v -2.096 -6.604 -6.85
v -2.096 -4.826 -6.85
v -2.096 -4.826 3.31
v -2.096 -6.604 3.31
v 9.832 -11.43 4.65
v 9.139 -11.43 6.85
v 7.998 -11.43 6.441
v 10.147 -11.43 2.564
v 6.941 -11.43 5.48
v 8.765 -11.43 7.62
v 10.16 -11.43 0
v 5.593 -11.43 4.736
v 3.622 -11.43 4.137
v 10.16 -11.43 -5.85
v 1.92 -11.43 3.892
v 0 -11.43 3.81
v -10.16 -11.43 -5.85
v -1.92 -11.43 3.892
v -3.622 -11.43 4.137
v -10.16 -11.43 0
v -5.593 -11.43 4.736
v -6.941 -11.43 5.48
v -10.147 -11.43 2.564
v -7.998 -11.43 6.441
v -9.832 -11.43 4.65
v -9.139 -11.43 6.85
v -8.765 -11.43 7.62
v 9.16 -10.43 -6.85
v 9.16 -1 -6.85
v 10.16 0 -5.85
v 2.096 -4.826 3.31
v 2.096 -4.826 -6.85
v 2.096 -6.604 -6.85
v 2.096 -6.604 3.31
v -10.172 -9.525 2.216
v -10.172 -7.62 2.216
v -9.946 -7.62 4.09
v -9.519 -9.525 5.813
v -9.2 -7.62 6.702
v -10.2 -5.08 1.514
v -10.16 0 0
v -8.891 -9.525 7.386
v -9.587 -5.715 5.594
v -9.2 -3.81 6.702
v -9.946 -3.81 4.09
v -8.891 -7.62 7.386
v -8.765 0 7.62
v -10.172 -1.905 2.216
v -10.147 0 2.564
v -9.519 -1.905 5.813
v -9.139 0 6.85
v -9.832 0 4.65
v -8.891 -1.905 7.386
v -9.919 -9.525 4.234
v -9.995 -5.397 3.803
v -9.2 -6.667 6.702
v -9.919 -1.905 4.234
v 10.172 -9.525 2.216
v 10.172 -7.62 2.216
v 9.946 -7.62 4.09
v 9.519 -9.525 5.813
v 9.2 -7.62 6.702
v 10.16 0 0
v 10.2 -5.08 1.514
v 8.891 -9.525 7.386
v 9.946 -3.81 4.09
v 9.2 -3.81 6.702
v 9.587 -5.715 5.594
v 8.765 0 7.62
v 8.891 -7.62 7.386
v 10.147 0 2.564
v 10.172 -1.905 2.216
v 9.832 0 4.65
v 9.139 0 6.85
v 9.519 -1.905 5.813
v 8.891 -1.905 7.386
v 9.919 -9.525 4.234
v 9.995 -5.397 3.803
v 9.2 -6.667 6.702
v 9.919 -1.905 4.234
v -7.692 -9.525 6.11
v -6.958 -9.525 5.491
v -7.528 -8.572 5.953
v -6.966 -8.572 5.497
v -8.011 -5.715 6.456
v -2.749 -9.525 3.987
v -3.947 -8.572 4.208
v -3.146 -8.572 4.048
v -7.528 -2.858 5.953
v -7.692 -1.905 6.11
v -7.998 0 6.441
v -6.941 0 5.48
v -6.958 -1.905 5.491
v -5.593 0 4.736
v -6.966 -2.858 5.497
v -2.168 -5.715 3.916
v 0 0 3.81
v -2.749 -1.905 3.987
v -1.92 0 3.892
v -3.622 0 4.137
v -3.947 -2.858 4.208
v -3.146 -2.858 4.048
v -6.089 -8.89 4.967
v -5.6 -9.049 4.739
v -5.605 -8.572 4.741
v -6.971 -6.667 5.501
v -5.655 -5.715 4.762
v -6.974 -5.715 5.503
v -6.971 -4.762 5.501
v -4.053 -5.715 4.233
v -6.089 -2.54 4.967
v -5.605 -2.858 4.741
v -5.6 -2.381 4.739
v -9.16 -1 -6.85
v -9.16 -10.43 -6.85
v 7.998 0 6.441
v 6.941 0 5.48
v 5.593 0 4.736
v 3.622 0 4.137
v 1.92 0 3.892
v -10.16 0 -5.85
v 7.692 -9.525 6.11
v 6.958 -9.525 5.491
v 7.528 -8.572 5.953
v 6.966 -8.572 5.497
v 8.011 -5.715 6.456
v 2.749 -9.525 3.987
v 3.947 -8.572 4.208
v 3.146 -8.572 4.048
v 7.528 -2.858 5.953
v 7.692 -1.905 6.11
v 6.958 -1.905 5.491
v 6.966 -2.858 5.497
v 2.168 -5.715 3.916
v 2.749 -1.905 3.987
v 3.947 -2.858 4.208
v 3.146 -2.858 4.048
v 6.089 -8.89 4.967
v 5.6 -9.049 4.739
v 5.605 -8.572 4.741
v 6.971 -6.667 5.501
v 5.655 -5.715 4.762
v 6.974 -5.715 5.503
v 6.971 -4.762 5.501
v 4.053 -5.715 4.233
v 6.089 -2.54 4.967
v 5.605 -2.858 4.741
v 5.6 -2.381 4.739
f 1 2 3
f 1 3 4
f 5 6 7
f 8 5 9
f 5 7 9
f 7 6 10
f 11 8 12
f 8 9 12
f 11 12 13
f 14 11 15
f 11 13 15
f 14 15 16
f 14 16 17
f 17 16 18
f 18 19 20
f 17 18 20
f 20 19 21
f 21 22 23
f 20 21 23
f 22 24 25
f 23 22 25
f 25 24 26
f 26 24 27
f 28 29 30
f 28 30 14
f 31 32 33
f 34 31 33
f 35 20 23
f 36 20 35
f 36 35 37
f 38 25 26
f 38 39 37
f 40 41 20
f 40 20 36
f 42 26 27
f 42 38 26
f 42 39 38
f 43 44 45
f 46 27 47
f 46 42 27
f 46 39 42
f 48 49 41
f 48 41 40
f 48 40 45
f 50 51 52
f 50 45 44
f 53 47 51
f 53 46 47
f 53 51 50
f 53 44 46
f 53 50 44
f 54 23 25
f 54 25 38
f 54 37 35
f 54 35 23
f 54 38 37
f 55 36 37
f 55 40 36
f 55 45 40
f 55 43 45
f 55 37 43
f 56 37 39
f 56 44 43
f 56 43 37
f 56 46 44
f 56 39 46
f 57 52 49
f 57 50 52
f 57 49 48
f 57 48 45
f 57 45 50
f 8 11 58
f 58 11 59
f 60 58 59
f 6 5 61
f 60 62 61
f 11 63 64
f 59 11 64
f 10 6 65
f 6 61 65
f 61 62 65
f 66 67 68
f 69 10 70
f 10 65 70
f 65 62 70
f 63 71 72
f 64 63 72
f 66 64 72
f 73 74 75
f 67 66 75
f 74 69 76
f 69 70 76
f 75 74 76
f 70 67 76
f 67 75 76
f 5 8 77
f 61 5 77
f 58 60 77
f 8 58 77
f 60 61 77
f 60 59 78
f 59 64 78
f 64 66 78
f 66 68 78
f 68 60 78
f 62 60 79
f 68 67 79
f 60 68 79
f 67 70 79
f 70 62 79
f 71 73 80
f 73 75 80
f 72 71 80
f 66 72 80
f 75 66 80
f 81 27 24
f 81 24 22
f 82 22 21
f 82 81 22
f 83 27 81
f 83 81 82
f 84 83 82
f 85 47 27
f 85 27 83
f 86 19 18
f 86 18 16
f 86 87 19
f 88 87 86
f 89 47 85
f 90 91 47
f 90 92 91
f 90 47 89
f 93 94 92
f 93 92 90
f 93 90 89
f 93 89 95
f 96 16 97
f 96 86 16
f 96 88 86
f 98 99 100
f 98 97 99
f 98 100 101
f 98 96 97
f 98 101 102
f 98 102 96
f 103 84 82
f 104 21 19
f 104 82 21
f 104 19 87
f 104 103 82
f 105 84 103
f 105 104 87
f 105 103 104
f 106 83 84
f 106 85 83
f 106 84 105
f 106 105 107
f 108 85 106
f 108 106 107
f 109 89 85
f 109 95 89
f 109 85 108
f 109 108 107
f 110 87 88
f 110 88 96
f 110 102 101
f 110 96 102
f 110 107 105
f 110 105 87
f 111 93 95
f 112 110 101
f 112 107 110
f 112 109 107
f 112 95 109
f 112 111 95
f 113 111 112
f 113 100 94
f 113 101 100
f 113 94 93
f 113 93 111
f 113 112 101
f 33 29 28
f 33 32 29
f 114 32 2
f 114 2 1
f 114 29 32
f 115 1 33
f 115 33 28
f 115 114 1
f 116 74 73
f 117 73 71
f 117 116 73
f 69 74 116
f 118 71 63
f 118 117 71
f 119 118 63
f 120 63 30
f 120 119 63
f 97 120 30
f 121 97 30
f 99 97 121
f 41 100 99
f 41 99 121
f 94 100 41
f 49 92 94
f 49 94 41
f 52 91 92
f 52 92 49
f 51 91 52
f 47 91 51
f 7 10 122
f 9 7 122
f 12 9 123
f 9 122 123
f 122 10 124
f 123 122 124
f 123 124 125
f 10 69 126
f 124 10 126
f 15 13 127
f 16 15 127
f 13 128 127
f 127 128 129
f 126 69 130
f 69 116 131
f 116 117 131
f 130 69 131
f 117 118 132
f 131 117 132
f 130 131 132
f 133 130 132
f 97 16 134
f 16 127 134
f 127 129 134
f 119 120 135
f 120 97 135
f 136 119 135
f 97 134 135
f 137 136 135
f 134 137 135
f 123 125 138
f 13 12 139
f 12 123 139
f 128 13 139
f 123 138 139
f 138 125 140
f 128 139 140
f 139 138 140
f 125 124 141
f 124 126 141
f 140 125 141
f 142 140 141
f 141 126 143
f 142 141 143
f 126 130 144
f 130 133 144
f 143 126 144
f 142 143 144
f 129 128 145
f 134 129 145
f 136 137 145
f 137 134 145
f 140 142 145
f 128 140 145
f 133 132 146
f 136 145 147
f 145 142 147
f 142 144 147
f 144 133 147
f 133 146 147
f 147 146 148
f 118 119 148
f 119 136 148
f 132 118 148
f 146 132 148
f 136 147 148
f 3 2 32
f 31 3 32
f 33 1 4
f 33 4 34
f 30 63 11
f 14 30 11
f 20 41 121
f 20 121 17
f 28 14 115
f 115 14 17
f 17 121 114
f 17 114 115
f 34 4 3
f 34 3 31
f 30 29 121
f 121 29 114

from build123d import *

# Parameters (mm, degrees)
PAD_DEPTH        = 11.43
MIRRORED_FACE5_W = 11.43
MIRRORED_FACE5_H = 20.32
PAD001_DEPTH     = 6.85
SKETCH001_W      = 4.191
SKETCH001_H      = 1.778
POCKET_DEPTH     = 10.16
CHAMFER_SIZE     = 1


with BuildPart() as part:
    # Sketch → Pad (new body)
    with BuildSketch(Plane.XZ):
        with BuildLine():
            Line((0, 0), (-10.16, 0))
            add(Edge.make_bspline(
                [(-10.16, 0), (-10.491854, 4.757151), (-8.764645, 7.62), (-8.764645, 7.62)],
                knots=[0, 0, 0, 0, 1, 1, 1, 1], degree=3))
            add(Edge.make_bspline(
                [(-8.764645, 7.62), (-6.92736, 3.81), (0, 3.81)],
                knots=[0, 0, 0, 1, 1, 1], degree=2))
            Line((0, 3.81), (0, 0))
        make_face()
    extrude(amount=PAD_DEPTH)

    # Mirrored: part across YZ


with BuildPart() as part_1:
    add(part.part)
    add(part.part.mirror(Plane.YZ))

    # Mirrored Face5 → Pad001 (add)
    with BuildSketch(Plane(origin=(0, -5.715, 0), x_dir=(0, -1, 0), z_dir=(0, 0, -1))):
        Rectangle(MIRRORED_FACE5_W, MIRRORED_FACE5_H)
    extrude(amount=PAD001_DEPTH)

    # Sketch001 (on Face4 of Pad001) → Pocket (cut)
    with BuildSketch(Plane(origin=(0, 0, -6.85), x_dir=(1, 0, 0), z_dir=(0, 0, -1))):
        with Locations((0, 5.715)):
            Rectangle(SKETCH001_W, SKETCH001_H)
    extrude(amount=-POCKET_DEPTH, mode=Mode.SUBTRACT)

    # Chamfer
    chamfer_edges = [part_1.edges().sort_by_distance(p)[0] for p in [
        (0, 0, -6.85),
        (10.16, -5.715, -6.85),
        (0, -11.43, -6.85),
        (-10.16, -5.715, -6.85),
    ]]
    chamfer(chamfer_edges, length=CHAMFER_SIZE)


solid = part_1.part
